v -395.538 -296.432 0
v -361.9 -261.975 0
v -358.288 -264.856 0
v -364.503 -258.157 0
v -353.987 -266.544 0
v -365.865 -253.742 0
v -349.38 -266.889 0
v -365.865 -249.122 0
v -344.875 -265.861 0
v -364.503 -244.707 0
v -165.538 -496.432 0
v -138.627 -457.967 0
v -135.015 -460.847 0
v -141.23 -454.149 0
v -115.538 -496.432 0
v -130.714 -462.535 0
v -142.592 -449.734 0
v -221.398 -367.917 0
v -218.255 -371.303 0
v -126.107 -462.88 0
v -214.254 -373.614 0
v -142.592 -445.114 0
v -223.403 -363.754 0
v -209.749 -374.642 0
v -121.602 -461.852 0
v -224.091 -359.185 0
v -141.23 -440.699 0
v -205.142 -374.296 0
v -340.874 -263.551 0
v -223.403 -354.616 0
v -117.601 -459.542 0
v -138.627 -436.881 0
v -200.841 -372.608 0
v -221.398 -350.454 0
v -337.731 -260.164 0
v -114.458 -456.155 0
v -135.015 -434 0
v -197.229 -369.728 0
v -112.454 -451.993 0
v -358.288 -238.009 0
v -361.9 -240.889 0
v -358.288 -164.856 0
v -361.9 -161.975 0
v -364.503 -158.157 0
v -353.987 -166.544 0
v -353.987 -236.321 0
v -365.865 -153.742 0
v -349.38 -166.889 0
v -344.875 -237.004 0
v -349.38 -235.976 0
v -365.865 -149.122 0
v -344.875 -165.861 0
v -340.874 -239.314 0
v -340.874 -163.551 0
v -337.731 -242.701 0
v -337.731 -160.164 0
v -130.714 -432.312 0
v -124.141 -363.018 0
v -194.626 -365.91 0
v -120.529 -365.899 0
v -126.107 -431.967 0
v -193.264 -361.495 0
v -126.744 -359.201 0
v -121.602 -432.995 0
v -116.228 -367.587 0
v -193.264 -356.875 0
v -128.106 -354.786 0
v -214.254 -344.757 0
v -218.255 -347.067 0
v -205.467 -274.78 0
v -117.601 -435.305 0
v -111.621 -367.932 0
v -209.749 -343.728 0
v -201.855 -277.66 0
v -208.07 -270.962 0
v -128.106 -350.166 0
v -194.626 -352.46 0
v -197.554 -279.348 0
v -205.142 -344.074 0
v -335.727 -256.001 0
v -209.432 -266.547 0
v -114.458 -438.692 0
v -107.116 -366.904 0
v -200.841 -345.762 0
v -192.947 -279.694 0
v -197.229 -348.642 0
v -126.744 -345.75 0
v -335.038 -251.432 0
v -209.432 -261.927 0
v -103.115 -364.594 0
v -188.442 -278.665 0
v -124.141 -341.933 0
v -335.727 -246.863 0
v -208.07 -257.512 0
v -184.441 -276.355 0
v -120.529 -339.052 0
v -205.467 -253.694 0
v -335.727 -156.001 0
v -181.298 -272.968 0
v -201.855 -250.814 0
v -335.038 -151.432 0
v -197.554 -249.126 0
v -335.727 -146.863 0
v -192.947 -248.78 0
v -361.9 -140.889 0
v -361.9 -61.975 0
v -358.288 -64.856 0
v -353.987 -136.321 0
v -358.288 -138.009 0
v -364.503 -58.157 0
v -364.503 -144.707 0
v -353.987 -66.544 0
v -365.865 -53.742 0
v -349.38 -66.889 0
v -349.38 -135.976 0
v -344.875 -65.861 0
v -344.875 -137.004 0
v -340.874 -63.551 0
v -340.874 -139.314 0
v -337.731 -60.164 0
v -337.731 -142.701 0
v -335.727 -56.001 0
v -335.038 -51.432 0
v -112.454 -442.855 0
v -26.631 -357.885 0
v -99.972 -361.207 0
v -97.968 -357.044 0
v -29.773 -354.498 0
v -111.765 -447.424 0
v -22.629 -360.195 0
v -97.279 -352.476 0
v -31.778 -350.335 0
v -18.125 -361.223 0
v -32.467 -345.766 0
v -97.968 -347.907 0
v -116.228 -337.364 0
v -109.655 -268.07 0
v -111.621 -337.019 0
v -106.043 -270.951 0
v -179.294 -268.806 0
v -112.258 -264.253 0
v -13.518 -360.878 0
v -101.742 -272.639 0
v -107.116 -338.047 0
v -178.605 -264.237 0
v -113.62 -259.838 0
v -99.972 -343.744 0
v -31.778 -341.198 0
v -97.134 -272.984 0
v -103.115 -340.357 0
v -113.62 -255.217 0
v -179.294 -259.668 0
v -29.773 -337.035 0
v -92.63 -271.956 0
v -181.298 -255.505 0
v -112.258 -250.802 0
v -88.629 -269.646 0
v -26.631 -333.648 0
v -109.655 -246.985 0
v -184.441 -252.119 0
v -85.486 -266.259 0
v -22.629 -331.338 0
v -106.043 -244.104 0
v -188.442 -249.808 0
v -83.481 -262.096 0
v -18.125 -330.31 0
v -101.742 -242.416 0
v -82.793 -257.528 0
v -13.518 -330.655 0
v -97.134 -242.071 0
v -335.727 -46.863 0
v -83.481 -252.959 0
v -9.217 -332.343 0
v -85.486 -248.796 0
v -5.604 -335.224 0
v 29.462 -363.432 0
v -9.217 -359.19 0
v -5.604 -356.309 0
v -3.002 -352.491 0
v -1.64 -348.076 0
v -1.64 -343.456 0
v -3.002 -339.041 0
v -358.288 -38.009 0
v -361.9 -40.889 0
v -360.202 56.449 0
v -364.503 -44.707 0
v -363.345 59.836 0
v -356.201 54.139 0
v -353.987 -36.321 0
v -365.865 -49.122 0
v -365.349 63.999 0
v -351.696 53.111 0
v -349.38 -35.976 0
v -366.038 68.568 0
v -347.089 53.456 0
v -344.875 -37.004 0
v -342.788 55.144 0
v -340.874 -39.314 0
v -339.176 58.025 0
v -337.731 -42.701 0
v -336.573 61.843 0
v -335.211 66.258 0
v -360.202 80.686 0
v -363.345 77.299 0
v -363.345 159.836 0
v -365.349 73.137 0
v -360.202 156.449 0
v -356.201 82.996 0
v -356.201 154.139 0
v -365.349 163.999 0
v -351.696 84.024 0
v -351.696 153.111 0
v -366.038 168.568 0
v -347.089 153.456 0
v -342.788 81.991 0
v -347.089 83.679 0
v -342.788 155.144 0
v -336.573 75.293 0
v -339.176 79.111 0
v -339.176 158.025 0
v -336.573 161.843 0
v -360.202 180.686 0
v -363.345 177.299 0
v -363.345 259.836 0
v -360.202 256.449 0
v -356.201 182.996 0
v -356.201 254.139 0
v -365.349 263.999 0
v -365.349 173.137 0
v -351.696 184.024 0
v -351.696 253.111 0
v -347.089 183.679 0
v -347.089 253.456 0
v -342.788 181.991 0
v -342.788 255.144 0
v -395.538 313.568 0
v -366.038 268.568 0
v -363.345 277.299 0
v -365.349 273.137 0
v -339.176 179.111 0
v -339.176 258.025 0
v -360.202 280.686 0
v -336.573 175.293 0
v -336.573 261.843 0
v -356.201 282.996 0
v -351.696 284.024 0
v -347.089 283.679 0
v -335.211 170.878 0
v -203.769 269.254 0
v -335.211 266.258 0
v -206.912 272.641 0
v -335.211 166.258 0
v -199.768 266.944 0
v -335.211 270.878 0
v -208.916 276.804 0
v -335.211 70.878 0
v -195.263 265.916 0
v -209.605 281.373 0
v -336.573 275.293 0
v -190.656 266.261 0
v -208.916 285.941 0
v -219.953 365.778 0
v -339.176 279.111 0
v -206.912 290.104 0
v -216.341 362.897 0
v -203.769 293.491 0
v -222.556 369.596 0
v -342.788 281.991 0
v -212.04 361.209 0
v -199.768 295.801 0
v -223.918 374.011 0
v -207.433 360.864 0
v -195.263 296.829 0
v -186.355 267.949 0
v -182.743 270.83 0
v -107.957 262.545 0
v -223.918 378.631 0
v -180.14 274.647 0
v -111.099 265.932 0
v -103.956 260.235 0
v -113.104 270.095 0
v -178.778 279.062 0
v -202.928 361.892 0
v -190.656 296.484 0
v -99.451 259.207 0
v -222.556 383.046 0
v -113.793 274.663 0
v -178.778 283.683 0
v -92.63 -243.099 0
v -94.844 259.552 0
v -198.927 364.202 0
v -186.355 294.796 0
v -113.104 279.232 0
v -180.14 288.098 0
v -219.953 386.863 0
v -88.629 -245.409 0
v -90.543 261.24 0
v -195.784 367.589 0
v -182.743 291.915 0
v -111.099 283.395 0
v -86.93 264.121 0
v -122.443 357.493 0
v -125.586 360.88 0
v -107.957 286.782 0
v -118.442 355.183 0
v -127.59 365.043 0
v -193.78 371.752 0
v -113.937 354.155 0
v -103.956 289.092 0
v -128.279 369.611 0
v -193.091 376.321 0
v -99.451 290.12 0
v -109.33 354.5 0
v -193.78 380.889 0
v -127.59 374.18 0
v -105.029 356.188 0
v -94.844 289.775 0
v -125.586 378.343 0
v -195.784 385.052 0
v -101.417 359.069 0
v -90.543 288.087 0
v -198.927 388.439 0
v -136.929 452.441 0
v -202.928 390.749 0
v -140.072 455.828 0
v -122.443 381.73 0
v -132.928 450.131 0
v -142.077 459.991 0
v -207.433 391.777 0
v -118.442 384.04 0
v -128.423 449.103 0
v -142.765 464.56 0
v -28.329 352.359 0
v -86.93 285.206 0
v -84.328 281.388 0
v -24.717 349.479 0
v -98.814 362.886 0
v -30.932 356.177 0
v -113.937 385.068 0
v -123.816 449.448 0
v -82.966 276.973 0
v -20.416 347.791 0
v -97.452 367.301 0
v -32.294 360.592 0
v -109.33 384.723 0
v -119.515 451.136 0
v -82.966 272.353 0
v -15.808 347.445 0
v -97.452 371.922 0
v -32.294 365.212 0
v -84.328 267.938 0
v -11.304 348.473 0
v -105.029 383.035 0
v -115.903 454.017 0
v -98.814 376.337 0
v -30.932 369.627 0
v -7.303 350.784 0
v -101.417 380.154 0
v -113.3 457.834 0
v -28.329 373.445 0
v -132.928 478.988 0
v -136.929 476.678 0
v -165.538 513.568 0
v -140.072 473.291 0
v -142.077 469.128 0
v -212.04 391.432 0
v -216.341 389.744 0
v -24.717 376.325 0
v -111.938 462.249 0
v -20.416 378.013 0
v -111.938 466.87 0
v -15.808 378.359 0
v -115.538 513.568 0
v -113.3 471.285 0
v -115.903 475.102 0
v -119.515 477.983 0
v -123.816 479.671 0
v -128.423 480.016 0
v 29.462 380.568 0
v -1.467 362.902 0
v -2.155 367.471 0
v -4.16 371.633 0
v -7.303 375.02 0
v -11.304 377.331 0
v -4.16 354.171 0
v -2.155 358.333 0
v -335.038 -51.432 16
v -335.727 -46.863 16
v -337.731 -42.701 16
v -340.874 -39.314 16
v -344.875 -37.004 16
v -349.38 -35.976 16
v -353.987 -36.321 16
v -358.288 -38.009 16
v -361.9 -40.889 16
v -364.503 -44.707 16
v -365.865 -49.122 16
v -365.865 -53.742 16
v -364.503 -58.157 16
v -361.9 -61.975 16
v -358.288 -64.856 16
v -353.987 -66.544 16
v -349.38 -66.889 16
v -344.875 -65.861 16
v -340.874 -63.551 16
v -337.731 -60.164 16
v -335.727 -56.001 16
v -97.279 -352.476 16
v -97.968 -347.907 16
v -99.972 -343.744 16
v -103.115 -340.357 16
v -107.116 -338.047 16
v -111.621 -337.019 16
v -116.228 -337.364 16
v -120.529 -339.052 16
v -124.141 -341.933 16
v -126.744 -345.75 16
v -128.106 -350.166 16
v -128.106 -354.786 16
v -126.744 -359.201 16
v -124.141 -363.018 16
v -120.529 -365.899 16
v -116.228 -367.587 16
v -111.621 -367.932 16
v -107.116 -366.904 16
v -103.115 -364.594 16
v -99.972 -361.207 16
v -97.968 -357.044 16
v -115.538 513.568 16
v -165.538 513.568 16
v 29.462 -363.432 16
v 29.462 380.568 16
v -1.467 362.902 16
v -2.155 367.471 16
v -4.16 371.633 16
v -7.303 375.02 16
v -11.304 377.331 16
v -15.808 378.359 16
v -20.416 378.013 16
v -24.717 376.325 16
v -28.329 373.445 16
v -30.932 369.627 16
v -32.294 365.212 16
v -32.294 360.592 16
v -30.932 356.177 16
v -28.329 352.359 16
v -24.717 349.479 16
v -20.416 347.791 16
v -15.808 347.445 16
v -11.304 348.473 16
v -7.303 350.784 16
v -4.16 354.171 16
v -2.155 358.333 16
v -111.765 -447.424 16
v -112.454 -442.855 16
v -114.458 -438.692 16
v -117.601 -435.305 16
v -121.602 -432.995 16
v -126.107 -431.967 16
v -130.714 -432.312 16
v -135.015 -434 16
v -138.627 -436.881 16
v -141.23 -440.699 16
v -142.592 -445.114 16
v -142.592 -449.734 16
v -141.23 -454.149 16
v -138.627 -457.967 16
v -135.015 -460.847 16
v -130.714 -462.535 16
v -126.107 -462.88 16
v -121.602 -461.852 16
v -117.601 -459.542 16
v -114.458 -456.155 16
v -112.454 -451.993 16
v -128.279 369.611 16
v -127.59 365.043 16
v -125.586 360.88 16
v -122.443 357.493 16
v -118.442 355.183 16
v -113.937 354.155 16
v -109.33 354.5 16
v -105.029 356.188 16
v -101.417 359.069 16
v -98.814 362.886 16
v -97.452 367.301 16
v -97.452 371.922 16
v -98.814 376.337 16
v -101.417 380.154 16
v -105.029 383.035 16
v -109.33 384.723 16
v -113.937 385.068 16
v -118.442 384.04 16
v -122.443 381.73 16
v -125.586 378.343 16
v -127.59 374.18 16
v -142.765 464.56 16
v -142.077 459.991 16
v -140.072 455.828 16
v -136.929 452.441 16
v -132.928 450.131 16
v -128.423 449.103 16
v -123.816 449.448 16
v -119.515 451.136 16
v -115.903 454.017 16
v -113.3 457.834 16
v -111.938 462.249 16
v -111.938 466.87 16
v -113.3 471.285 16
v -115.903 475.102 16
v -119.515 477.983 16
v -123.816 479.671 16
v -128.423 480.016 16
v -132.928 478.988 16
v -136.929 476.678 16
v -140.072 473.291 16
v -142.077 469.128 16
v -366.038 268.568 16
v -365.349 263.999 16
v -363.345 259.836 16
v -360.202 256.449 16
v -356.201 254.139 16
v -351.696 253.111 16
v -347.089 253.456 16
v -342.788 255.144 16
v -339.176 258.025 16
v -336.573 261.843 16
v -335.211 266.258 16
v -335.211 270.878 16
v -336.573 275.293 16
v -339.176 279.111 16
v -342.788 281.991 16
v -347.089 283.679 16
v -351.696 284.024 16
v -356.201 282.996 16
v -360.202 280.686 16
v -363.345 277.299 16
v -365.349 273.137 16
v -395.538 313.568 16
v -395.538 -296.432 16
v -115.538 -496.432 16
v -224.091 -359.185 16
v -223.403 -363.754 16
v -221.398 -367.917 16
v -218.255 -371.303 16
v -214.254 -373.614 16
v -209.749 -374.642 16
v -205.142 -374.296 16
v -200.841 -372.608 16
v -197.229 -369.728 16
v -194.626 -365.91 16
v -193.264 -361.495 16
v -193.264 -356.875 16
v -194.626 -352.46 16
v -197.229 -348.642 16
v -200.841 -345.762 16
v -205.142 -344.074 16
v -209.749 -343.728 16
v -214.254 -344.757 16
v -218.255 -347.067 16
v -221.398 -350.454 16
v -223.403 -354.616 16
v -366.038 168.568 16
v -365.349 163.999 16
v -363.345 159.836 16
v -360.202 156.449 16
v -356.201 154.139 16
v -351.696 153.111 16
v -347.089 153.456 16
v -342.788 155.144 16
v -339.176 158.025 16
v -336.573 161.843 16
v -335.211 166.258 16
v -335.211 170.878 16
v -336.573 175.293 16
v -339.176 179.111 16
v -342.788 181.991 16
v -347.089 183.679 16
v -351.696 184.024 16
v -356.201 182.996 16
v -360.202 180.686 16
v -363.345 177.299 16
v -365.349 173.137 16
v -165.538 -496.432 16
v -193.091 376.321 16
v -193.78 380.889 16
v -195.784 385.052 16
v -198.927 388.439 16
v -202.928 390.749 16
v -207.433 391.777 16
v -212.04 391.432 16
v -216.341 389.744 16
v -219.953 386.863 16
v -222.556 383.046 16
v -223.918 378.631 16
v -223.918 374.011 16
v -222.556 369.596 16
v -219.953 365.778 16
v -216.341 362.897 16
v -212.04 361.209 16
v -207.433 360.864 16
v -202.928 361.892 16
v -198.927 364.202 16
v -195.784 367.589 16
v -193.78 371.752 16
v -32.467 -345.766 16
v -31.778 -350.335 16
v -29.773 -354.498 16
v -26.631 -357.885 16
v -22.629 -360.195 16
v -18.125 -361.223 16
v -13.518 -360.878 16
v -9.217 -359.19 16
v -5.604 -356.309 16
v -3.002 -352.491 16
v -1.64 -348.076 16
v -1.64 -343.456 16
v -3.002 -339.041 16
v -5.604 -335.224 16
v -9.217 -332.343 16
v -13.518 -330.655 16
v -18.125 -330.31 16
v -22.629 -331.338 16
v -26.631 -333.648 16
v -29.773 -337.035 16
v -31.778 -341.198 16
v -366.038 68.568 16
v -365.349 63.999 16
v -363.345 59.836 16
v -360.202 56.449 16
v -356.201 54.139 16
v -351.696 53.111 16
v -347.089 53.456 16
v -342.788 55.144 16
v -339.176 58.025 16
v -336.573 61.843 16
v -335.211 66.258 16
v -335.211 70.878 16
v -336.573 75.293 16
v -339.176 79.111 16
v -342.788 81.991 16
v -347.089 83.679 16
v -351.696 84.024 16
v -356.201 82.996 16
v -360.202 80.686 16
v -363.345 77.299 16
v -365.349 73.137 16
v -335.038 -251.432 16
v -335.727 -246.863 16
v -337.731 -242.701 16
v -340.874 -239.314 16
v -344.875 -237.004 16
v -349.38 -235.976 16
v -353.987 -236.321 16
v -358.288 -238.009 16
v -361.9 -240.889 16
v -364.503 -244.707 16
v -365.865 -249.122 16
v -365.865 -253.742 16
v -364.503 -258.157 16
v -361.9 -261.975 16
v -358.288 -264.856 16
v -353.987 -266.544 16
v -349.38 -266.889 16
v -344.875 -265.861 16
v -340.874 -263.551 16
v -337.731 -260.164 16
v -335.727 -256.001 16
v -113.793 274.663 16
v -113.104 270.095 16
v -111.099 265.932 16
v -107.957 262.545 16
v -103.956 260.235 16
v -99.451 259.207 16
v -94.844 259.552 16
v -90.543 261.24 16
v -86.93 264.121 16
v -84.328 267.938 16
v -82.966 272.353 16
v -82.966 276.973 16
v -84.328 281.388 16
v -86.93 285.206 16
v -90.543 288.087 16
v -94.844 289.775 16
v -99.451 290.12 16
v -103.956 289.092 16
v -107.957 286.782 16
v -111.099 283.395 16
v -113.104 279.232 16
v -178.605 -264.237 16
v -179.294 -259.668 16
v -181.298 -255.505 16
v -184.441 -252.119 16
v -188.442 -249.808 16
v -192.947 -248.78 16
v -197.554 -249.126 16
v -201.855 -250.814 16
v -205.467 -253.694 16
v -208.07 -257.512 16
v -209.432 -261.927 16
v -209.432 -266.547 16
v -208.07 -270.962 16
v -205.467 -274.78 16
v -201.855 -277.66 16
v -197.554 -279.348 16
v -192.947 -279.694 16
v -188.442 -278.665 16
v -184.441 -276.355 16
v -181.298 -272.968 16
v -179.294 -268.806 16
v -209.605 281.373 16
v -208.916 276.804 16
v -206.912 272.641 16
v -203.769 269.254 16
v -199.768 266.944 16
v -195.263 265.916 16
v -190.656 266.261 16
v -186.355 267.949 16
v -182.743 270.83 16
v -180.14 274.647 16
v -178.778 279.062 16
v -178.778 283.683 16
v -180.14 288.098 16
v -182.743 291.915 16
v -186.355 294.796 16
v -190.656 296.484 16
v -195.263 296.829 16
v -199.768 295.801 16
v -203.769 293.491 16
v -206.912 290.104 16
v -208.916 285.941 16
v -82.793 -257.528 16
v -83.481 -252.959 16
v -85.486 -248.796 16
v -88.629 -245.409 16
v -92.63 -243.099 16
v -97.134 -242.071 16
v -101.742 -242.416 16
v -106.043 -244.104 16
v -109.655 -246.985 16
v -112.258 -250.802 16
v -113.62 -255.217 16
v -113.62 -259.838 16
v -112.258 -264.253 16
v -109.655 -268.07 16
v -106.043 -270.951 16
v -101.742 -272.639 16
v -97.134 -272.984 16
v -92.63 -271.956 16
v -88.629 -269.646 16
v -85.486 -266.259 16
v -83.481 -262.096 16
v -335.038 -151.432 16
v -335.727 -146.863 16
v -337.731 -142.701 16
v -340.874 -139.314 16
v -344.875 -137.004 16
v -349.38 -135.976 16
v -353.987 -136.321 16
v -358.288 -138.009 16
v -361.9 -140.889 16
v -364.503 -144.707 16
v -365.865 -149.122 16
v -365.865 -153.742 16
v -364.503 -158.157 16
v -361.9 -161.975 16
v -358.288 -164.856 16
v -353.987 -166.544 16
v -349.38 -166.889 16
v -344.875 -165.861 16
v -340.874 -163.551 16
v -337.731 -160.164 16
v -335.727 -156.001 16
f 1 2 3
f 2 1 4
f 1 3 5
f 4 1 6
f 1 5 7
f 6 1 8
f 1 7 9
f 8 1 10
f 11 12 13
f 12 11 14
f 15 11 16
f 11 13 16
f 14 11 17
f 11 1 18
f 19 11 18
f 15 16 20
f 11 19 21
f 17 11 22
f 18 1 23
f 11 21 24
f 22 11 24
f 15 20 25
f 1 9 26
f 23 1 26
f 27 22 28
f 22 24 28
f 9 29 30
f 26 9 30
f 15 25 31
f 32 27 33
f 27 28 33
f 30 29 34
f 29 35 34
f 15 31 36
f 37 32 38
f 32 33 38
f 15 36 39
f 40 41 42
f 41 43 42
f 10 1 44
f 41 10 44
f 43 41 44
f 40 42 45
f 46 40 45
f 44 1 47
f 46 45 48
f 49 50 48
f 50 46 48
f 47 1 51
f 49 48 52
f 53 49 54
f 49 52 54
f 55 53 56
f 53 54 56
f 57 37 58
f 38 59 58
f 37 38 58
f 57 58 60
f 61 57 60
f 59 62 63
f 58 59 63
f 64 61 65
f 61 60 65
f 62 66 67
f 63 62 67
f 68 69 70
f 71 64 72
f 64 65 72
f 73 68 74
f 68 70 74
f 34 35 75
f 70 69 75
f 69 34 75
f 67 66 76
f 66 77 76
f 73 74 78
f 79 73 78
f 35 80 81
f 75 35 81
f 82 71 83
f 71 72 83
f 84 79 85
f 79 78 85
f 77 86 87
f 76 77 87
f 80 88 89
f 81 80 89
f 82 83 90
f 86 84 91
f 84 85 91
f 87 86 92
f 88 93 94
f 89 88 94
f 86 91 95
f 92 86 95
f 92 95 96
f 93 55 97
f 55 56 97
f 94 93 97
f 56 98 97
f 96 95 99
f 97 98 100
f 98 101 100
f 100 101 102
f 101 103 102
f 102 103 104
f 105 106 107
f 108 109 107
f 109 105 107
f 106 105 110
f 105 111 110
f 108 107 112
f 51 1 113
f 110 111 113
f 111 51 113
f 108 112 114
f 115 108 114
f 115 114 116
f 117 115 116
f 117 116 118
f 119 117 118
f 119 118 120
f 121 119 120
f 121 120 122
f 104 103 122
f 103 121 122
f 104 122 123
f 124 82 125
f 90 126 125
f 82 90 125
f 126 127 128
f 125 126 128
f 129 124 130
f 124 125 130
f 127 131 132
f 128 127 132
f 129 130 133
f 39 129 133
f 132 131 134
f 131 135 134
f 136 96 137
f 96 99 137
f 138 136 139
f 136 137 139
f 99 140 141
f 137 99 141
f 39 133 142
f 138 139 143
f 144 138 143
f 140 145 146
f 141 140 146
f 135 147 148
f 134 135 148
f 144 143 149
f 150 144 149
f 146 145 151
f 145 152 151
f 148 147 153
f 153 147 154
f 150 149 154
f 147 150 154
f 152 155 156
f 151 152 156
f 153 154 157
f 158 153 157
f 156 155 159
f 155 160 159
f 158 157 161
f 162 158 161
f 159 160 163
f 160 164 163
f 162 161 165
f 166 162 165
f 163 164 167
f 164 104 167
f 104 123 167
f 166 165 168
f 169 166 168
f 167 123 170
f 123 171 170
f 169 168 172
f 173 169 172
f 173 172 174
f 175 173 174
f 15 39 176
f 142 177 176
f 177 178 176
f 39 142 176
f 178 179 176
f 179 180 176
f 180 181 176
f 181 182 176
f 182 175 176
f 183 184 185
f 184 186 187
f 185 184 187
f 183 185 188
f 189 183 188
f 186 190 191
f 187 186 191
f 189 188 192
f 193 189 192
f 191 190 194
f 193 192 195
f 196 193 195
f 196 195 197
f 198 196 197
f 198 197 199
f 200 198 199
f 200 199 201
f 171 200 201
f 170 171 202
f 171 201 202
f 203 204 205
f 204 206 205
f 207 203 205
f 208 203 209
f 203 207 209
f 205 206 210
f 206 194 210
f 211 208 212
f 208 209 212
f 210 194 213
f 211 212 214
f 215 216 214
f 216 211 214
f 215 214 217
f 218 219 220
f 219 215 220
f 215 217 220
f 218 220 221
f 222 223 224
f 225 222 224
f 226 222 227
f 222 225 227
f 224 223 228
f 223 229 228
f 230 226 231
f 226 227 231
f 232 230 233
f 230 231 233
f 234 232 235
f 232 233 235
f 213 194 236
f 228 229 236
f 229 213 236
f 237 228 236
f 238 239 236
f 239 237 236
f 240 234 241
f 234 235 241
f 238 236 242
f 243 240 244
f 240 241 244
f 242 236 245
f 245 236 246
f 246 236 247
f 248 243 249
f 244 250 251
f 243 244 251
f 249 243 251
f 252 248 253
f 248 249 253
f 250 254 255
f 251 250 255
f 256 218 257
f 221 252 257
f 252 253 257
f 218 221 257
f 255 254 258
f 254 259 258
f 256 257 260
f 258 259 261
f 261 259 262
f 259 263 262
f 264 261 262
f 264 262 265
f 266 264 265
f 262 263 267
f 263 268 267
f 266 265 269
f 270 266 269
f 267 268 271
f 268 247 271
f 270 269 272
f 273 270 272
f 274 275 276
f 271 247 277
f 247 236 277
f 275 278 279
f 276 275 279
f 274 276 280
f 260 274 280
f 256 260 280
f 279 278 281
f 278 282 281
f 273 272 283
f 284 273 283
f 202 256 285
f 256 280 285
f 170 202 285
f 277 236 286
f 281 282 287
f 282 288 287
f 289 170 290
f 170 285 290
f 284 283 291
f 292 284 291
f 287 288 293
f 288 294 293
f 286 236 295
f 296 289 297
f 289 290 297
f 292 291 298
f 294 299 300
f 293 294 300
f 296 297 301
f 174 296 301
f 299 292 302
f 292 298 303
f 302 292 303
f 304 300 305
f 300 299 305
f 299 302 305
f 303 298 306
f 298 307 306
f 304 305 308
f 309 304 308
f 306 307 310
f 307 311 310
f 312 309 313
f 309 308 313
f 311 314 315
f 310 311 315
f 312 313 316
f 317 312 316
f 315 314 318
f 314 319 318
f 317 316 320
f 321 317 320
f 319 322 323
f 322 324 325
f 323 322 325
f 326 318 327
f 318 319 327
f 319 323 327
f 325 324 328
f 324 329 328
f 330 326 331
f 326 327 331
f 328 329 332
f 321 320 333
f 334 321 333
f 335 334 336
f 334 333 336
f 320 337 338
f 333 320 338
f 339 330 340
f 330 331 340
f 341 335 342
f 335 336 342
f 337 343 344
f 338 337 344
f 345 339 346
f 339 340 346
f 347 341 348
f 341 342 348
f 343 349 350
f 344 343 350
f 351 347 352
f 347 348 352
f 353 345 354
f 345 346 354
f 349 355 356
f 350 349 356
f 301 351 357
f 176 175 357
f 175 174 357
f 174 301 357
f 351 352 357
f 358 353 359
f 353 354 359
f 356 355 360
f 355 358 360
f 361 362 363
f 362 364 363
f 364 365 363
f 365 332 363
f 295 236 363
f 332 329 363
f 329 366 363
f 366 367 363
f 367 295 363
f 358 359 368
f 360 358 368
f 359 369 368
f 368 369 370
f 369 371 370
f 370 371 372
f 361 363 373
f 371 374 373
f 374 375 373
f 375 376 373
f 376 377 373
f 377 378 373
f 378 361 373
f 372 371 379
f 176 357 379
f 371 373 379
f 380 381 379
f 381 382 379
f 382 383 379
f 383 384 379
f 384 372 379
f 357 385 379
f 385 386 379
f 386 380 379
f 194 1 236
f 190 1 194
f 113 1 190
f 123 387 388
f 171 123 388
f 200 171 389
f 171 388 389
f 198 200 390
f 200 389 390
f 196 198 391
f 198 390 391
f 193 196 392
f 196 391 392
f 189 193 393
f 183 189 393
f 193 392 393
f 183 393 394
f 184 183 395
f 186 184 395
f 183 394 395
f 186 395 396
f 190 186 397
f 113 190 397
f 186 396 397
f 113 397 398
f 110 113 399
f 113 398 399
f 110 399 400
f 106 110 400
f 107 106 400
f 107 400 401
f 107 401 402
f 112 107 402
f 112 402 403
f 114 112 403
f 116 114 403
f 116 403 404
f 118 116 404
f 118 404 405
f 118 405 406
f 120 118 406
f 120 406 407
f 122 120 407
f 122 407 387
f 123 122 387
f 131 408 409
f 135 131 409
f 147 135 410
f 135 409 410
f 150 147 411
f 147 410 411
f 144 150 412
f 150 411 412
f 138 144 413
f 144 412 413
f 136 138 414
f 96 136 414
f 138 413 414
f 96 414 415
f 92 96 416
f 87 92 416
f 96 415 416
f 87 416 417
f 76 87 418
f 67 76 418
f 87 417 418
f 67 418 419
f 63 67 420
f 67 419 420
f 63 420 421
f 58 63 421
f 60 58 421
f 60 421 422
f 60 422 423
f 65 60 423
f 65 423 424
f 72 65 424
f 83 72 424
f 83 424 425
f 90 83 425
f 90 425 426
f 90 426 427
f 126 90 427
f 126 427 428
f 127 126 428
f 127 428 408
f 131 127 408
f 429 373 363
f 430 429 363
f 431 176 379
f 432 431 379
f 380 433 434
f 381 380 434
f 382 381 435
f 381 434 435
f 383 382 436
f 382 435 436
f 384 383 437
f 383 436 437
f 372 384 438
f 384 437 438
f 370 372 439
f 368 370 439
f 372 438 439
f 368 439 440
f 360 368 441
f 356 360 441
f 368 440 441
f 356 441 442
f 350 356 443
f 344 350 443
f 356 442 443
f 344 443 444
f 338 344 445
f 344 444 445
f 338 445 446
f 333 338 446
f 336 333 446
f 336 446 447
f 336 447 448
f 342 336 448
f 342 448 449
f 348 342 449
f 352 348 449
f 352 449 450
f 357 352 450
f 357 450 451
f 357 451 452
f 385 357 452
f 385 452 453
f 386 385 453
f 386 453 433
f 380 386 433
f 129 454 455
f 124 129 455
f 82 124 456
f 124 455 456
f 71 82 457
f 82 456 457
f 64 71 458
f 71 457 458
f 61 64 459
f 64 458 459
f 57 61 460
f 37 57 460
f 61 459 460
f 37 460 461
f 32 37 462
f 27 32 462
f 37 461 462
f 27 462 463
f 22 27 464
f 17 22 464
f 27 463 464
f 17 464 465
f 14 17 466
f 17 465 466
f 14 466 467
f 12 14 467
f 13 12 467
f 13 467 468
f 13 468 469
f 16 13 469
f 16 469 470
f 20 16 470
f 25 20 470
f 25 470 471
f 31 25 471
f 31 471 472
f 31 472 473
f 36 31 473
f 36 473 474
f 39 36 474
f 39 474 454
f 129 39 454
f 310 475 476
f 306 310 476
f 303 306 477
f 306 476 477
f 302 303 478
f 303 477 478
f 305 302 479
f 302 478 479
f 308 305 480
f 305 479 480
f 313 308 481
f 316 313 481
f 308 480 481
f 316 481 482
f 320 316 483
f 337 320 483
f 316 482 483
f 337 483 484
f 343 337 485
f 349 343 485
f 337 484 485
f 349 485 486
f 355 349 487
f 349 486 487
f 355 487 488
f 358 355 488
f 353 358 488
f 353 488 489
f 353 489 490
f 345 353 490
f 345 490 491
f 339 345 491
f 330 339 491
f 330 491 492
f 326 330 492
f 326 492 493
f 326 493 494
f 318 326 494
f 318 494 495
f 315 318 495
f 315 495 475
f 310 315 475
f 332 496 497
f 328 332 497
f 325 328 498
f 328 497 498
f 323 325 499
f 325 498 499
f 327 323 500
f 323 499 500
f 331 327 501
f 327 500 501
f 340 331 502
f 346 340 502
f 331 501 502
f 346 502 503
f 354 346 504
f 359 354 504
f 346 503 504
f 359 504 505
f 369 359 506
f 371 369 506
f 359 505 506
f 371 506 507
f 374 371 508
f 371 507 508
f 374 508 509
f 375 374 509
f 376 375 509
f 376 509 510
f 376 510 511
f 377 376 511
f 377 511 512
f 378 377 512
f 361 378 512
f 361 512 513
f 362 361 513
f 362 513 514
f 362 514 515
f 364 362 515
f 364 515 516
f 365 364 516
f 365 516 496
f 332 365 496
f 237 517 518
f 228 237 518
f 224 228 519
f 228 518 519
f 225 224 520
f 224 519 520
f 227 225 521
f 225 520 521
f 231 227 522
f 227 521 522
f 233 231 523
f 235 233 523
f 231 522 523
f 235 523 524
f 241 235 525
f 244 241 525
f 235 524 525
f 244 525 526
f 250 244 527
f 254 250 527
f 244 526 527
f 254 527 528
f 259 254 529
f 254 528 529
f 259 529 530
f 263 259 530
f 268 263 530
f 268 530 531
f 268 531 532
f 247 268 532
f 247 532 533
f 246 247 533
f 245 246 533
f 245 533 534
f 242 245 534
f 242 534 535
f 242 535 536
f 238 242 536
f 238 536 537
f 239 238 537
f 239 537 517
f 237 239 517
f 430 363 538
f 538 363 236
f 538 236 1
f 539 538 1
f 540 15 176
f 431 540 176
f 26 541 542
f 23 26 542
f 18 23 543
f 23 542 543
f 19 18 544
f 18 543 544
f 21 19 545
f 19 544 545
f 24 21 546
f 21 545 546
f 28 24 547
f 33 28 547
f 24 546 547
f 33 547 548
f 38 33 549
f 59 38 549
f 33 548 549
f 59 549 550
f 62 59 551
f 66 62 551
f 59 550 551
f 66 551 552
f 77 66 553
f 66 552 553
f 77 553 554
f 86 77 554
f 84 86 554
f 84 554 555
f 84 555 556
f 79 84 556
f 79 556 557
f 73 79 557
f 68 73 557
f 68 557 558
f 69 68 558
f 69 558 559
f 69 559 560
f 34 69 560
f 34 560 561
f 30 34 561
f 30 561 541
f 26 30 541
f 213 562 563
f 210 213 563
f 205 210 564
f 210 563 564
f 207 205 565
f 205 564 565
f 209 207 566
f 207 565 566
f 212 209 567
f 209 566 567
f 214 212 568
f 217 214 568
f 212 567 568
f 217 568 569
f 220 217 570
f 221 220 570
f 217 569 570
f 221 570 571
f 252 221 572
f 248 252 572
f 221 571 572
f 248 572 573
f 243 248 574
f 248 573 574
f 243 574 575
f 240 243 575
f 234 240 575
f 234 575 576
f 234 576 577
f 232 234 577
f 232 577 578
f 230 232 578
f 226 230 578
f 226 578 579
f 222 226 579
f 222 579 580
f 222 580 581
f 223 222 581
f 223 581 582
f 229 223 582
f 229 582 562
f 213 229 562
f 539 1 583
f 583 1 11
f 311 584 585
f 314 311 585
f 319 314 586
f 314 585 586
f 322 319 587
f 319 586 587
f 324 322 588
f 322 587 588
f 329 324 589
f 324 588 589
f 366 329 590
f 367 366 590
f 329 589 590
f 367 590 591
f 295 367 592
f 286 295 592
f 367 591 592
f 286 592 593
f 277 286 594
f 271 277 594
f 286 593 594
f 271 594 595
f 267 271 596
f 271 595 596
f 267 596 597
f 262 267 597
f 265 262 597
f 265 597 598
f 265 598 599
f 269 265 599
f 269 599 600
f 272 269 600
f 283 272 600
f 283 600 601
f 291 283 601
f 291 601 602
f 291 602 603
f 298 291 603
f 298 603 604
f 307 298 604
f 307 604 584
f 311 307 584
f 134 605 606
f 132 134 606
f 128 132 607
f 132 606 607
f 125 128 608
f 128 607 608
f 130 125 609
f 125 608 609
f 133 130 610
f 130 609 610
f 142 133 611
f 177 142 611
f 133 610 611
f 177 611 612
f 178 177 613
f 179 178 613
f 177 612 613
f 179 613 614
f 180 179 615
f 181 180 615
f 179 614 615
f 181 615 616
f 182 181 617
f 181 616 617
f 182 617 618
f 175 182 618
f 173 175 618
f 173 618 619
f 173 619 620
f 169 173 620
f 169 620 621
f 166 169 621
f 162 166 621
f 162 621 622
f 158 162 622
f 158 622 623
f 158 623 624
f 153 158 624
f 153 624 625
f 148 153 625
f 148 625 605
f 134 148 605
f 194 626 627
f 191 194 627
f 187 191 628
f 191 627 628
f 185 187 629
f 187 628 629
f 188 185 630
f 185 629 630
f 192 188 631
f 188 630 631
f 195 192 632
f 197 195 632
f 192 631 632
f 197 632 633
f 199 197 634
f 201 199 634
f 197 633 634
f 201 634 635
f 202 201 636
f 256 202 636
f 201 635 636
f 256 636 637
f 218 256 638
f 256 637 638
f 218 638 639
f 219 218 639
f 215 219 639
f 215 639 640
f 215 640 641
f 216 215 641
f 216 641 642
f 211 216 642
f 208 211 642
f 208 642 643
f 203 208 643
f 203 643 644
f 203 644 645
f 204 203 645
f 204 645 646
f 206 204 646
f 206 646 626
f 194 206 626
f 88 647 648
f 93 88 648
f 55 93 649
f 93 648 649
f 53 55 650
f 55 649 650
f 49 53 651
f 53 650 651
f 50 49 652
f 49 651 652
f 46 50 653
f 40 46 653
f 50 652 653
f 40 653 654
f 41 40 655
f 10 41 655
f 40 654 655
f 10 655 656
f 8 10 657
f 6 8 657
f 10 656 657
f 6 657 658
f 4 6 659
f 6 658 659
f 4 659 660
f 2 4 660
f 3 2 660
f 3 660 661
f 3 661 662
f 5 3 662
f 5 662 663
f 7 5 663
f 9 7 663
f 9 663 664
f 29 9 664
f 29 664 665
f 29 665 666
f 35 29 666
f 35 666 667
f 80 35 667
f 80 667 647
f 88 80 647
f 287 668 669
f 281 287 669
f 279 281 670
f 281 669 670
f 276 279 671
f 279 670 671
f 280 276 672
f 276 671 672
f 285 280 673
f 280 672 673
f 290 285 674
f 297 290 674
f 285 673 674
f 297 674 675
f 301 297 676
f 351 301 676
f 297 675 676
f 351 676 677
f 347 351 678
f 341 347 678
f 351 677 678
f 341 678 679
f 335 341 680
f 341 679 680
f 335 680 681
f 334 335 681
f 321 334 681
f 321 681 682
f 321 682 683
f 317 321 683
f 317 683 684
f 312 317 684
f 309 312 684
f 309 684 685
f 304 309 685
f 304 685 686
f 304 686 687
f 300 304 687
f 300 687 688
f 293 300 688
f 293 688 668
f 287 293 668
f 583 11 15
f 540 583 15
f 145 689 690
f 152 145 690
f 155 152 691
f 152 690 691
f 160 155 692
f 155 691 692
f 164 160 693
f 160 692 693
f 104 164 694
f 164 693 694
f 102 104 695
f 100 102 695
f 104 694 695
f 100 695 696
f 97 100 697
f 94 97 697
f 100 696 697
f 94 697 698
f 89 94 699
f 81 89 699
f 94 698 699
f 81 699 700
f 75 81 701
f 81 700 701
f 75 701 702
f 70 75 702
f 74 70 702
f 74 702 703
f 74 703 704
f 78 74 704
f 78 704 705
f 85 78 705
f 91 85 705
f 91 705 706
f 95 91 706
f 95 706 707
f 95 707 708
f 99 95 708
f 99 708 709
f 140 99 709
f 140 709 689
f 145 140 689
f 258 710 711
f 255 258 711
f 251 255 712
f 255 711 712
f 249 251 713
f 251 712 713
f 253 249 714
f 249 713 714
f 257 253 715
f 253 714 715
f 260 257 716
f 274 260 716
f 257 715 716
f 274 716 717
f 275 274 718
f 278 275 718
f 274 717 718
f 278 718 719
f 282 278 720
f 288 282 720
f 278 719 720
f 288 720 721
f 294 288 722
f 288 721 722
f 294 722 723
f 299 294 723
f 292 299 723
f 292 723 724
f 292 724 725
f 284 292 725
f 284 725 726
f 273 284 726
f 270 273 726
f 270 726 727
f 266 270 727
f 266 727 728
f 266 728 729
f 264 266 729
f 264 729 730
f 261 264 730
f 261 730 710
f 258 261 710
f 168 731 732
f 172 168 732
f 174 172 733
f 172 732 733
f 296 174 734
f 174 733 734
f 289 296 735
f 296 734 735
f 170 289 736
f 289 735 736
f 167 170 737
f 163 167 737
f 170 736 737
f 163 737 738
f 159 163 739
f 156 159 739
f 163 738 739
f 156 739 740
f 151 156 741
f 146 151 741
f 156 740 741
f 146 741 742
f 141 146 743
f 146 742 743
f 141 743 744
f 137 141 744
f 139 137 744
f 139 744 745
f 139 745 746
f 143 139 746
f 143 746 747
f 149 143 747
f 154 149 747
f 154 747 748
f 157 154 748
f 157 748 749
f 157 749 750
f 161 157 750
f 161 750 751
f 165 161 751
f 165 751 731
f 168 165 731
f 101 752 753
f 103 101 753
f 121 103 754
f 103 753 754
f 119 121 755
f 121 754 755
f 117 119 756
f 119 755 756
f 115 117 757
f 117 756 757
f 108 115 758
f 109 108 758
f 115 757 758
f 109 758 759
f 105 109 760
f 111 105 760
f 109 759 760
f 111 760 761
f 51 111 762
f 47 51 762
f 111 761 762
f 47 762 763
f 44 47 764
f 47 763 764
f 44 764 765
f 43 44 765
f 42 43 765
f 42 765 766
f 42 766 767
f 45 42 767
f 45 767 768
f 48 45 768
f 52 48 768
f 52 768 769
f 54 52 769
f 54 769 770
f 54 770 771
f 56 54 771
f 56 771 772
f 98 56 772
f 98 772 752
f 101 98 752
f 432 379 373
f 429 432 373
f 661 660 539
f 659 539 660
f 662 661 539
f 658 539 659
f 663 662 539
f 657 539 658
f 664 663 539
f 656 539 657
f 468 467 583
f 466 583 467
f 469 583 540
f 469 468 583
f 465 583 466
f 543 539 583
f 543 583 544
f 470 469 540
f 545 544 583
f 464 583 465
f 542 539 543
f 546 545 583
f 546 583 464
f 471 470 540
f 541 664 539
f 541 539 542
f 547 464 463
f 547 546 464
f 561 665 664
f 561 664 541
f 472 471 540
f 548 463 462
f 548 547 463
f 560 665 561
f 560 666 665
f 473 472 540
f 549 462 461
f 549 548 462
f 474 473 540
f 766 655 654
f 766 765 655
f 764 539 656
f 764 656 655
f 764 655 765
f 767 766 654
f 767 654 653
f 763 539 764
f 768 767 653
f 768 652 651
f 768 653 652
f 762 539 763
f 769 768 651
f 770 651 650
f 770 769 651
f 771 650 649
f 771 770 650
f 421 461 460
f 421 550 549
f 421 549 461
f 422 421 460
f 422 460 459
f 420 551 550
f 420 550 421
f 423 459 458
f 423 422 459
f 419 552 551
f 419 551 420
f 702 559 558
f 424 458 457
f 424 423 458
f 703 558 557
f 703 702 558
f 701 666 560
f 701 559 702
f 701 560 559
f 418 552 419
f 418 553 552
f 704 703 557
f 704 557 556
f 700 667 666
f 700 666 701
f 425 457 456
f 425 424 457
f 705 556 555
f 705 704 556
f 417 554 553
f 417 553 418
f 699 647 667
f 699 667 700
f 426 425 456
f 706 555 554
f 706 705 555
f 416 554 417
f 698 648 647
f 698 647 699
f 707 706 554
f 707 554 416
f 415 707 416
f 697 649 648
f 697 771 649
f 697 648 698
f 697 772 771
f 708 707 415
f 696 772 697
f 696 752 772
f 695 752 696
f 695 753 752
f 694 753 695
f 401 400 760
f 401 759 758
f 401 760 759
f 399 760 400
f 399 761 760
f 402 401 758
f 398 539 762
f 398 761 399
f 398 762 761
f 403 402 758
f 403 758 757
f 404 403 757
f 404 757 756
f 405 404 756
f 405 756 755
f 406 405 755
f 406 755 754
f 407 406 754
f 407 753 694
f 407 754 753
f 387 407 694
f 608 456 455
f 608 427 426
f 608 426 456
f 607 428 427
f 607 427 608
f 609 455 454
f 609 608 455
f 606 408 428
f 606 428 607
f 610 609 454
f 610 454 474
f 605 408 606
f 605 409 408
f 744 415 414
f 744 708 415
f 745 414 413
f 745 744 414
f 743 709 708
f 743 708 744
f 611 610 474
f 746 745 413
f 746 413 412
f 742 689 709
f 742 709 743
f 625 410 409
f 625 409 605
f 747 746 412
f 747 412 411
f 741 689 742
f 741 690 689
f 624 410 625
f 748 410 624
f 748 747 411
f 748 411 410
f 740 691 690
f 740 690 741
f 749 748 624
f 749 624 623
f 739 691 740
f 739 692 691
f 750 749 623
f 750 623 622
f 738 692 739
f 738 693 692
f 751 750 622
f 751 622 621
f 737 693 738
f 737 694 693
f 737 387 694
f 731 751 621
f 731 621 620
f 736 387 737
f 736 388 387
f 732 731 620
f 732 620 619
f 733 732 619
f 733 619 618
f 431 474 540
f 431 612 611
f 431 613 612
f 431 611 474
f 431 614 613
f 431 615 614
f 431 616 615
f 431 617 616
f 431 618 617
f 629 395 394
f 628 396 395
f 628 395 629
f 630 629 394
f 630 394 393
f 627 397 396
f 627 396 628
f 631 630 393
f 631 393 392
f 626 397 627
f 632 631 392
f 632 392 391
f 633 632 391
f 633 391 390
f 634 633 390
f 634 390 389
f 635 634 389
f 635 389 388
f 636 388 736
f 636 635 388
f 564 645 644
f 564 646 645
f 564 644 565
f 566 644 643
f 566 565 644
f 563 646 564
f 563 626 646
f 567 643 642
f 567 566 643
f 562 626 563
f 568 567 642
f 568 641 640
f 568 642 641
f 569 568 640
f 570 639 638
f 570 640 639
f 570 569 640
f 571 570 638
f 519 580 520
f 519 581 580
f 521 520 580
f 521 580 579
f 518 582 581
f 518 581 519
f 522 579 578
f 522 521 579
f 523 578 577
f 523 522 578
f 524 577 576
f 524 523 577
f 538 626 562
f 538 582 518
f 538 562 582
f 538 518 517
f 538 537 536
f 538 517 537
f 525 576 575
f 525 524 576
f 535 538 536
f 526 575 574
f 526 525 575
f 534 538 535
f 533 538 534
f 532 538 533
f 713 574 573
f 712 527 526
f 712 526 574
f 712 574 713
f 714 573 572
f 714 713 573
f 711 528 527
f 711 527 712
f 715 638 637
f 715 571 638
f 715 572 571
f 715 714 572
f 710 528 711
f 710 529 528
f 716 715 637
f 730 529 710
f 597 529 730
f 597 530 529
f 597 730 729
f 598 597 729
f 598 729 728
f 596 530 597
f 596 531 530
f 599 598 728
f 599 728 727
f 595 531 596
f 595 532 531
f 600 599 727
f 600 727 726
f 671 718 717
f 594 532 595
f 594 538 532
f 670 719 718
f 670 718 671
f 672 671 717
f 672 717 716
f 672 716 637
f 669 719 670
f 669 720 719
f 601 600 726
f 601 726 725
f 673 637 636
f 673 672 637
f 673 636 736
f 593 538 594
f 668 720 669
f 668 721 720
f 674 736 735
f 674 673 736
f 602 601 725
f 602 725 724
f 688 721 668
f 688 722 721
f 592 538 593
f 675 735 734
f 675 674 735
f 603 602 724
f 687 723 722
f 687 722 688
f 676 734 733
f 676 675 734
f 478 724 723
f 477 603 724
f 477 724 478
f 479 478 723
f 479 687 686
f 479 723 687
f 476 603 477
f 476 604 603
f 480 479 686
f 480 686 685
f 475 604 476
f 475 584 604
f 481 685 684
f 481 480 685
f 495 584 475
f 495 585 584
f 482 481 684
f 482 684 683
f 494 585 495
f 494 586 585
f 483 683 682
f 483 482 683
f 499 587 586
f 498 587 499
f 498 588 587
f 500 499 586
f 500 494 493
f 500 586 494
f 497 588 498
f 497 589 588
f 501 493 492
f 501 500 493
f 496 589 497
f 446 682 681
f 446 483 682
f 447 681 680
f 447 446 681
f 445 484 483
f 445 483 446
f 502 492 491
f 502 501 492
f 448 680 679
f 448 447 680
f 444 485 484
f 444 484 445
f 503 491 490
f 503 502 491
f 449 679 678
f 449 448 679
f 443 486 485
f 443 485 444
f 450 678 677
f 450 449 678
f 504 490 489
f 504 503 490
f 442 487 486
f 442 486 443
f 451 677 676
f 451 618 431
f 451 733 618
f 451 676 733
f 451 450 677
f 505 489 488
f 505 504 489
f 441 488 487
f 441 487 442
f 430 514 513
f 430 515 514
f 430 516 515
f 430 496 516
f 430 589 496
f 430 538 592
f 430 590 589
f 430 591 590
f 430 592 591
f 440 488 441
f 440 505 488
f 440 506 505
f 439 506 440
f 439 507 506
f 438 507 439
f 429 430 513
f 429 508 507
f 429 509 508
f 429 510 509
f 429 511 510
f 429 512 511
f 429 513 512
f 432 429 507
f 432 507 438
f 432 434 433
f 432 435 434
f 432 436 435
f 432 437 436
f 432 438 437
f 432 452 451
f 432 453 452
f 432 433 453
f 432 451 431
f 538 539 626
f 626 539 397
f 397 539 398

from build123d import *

# Parameters (mm, degrees)
EXTRUDE_1_DEPTH     = 16
SKETCH_2_R          = 15.5
CUT_EXTRUDE_2_DEPTH = 649.427486061


with BuildPart() as part:
    # 草图1 → 拉伸1 (new body)
    with BuildSketch(Plane.XY):
        Polygon((-395.537960369, 313.567840296), (-395.537960369, -296.432159704), (-165.537960369, -496.432159704), (-115.537960369, -496.432159704), (29.462039631, -363.432159704), (29.462039631, 380.567840296), (-115.537960369, 513.567840296), (-165.537960369, 513.567840296), align=None)
    extrude(amount=EXTRUDE_1_DEPTH)

    # 草图2 → 拉伸2 (cut, through all)
    with BuildSketch(Plane.XY.offset(16)):
        with Locations((-350.537960369, -51.432159704)):
            Circle(SKETCH_2_R)
        with Locations((-350.537960369, -251.432159704)):
            Circle(SKETCH_2_R)
        with Locations((-350.537960369, -151.432159704)):
            Circle(SKETCH_2_R)
        with Locations((-194.104974179, -264.23694972)):
            Circle(SKETCH_2_R)
        with Locations((-112.77894091, -352.475695817)):
            Circle(SKETCH_2_R)
        with Locations((-98.292741234, -257.527551975)):
            Circle(SKETCH_2_R)
        with Locations(Location((-208.591173855, -359.185093562, 0), (0, 0, 180))):
            Circle(SKETCH_2_R)
        with Locations((-127.265140586, -447.423839658)):
            Circle(SKETCH_2_R)
        with Locations(Location((-16.966707965, -345.766298072, 0), (0, 0, 180))):
            Circle(SKETCH_2_R)
        with Locations((-16.966707965, 362.901978664)):
            Circle(SKETCH_2_R)
        with Locations(Location((-127.265140586, 464.55952025, 0), (0, 0, 180))):
            Circle(SKETCH_2_R)
        with Locations((-208.591173855, 376.320774153)):
            Circle(SKETCH_2_R)
        with Locations(Location((-98.292741234, 274.663232567, 0), (0, 0, 180))):
            Circle(SKETCH_2_R)
        with Locations(Location((-112.77894091, 369.611376409, 0), (0, 0, 180))):
            Circle(SKETCH_2_R)
        with Locations(Location((-194.104974179, 281.372630312, 0), (0, 0, 180))):
            Circle(SKETCH_2_R)
        with Locations(Location((-350.537960369, 168.567840296, 0), (0, 0, 180))):
            Circle(SKETCH_2_R)
        with Locations(Location((-350.537960369, 268.567840296, 0), (0, 0, 180))):
            Circle(SKETCH_2_R)
        with Locations(Location((-350.537960369, 68.567840296, 0), (0, 0, 180))):
            Circle(SKETCH_2_R)
    extrude(amount=-CUT_EXTRUDE_2_DEPTH, mode=Mode.SUBTRACT)


solid = part.part
